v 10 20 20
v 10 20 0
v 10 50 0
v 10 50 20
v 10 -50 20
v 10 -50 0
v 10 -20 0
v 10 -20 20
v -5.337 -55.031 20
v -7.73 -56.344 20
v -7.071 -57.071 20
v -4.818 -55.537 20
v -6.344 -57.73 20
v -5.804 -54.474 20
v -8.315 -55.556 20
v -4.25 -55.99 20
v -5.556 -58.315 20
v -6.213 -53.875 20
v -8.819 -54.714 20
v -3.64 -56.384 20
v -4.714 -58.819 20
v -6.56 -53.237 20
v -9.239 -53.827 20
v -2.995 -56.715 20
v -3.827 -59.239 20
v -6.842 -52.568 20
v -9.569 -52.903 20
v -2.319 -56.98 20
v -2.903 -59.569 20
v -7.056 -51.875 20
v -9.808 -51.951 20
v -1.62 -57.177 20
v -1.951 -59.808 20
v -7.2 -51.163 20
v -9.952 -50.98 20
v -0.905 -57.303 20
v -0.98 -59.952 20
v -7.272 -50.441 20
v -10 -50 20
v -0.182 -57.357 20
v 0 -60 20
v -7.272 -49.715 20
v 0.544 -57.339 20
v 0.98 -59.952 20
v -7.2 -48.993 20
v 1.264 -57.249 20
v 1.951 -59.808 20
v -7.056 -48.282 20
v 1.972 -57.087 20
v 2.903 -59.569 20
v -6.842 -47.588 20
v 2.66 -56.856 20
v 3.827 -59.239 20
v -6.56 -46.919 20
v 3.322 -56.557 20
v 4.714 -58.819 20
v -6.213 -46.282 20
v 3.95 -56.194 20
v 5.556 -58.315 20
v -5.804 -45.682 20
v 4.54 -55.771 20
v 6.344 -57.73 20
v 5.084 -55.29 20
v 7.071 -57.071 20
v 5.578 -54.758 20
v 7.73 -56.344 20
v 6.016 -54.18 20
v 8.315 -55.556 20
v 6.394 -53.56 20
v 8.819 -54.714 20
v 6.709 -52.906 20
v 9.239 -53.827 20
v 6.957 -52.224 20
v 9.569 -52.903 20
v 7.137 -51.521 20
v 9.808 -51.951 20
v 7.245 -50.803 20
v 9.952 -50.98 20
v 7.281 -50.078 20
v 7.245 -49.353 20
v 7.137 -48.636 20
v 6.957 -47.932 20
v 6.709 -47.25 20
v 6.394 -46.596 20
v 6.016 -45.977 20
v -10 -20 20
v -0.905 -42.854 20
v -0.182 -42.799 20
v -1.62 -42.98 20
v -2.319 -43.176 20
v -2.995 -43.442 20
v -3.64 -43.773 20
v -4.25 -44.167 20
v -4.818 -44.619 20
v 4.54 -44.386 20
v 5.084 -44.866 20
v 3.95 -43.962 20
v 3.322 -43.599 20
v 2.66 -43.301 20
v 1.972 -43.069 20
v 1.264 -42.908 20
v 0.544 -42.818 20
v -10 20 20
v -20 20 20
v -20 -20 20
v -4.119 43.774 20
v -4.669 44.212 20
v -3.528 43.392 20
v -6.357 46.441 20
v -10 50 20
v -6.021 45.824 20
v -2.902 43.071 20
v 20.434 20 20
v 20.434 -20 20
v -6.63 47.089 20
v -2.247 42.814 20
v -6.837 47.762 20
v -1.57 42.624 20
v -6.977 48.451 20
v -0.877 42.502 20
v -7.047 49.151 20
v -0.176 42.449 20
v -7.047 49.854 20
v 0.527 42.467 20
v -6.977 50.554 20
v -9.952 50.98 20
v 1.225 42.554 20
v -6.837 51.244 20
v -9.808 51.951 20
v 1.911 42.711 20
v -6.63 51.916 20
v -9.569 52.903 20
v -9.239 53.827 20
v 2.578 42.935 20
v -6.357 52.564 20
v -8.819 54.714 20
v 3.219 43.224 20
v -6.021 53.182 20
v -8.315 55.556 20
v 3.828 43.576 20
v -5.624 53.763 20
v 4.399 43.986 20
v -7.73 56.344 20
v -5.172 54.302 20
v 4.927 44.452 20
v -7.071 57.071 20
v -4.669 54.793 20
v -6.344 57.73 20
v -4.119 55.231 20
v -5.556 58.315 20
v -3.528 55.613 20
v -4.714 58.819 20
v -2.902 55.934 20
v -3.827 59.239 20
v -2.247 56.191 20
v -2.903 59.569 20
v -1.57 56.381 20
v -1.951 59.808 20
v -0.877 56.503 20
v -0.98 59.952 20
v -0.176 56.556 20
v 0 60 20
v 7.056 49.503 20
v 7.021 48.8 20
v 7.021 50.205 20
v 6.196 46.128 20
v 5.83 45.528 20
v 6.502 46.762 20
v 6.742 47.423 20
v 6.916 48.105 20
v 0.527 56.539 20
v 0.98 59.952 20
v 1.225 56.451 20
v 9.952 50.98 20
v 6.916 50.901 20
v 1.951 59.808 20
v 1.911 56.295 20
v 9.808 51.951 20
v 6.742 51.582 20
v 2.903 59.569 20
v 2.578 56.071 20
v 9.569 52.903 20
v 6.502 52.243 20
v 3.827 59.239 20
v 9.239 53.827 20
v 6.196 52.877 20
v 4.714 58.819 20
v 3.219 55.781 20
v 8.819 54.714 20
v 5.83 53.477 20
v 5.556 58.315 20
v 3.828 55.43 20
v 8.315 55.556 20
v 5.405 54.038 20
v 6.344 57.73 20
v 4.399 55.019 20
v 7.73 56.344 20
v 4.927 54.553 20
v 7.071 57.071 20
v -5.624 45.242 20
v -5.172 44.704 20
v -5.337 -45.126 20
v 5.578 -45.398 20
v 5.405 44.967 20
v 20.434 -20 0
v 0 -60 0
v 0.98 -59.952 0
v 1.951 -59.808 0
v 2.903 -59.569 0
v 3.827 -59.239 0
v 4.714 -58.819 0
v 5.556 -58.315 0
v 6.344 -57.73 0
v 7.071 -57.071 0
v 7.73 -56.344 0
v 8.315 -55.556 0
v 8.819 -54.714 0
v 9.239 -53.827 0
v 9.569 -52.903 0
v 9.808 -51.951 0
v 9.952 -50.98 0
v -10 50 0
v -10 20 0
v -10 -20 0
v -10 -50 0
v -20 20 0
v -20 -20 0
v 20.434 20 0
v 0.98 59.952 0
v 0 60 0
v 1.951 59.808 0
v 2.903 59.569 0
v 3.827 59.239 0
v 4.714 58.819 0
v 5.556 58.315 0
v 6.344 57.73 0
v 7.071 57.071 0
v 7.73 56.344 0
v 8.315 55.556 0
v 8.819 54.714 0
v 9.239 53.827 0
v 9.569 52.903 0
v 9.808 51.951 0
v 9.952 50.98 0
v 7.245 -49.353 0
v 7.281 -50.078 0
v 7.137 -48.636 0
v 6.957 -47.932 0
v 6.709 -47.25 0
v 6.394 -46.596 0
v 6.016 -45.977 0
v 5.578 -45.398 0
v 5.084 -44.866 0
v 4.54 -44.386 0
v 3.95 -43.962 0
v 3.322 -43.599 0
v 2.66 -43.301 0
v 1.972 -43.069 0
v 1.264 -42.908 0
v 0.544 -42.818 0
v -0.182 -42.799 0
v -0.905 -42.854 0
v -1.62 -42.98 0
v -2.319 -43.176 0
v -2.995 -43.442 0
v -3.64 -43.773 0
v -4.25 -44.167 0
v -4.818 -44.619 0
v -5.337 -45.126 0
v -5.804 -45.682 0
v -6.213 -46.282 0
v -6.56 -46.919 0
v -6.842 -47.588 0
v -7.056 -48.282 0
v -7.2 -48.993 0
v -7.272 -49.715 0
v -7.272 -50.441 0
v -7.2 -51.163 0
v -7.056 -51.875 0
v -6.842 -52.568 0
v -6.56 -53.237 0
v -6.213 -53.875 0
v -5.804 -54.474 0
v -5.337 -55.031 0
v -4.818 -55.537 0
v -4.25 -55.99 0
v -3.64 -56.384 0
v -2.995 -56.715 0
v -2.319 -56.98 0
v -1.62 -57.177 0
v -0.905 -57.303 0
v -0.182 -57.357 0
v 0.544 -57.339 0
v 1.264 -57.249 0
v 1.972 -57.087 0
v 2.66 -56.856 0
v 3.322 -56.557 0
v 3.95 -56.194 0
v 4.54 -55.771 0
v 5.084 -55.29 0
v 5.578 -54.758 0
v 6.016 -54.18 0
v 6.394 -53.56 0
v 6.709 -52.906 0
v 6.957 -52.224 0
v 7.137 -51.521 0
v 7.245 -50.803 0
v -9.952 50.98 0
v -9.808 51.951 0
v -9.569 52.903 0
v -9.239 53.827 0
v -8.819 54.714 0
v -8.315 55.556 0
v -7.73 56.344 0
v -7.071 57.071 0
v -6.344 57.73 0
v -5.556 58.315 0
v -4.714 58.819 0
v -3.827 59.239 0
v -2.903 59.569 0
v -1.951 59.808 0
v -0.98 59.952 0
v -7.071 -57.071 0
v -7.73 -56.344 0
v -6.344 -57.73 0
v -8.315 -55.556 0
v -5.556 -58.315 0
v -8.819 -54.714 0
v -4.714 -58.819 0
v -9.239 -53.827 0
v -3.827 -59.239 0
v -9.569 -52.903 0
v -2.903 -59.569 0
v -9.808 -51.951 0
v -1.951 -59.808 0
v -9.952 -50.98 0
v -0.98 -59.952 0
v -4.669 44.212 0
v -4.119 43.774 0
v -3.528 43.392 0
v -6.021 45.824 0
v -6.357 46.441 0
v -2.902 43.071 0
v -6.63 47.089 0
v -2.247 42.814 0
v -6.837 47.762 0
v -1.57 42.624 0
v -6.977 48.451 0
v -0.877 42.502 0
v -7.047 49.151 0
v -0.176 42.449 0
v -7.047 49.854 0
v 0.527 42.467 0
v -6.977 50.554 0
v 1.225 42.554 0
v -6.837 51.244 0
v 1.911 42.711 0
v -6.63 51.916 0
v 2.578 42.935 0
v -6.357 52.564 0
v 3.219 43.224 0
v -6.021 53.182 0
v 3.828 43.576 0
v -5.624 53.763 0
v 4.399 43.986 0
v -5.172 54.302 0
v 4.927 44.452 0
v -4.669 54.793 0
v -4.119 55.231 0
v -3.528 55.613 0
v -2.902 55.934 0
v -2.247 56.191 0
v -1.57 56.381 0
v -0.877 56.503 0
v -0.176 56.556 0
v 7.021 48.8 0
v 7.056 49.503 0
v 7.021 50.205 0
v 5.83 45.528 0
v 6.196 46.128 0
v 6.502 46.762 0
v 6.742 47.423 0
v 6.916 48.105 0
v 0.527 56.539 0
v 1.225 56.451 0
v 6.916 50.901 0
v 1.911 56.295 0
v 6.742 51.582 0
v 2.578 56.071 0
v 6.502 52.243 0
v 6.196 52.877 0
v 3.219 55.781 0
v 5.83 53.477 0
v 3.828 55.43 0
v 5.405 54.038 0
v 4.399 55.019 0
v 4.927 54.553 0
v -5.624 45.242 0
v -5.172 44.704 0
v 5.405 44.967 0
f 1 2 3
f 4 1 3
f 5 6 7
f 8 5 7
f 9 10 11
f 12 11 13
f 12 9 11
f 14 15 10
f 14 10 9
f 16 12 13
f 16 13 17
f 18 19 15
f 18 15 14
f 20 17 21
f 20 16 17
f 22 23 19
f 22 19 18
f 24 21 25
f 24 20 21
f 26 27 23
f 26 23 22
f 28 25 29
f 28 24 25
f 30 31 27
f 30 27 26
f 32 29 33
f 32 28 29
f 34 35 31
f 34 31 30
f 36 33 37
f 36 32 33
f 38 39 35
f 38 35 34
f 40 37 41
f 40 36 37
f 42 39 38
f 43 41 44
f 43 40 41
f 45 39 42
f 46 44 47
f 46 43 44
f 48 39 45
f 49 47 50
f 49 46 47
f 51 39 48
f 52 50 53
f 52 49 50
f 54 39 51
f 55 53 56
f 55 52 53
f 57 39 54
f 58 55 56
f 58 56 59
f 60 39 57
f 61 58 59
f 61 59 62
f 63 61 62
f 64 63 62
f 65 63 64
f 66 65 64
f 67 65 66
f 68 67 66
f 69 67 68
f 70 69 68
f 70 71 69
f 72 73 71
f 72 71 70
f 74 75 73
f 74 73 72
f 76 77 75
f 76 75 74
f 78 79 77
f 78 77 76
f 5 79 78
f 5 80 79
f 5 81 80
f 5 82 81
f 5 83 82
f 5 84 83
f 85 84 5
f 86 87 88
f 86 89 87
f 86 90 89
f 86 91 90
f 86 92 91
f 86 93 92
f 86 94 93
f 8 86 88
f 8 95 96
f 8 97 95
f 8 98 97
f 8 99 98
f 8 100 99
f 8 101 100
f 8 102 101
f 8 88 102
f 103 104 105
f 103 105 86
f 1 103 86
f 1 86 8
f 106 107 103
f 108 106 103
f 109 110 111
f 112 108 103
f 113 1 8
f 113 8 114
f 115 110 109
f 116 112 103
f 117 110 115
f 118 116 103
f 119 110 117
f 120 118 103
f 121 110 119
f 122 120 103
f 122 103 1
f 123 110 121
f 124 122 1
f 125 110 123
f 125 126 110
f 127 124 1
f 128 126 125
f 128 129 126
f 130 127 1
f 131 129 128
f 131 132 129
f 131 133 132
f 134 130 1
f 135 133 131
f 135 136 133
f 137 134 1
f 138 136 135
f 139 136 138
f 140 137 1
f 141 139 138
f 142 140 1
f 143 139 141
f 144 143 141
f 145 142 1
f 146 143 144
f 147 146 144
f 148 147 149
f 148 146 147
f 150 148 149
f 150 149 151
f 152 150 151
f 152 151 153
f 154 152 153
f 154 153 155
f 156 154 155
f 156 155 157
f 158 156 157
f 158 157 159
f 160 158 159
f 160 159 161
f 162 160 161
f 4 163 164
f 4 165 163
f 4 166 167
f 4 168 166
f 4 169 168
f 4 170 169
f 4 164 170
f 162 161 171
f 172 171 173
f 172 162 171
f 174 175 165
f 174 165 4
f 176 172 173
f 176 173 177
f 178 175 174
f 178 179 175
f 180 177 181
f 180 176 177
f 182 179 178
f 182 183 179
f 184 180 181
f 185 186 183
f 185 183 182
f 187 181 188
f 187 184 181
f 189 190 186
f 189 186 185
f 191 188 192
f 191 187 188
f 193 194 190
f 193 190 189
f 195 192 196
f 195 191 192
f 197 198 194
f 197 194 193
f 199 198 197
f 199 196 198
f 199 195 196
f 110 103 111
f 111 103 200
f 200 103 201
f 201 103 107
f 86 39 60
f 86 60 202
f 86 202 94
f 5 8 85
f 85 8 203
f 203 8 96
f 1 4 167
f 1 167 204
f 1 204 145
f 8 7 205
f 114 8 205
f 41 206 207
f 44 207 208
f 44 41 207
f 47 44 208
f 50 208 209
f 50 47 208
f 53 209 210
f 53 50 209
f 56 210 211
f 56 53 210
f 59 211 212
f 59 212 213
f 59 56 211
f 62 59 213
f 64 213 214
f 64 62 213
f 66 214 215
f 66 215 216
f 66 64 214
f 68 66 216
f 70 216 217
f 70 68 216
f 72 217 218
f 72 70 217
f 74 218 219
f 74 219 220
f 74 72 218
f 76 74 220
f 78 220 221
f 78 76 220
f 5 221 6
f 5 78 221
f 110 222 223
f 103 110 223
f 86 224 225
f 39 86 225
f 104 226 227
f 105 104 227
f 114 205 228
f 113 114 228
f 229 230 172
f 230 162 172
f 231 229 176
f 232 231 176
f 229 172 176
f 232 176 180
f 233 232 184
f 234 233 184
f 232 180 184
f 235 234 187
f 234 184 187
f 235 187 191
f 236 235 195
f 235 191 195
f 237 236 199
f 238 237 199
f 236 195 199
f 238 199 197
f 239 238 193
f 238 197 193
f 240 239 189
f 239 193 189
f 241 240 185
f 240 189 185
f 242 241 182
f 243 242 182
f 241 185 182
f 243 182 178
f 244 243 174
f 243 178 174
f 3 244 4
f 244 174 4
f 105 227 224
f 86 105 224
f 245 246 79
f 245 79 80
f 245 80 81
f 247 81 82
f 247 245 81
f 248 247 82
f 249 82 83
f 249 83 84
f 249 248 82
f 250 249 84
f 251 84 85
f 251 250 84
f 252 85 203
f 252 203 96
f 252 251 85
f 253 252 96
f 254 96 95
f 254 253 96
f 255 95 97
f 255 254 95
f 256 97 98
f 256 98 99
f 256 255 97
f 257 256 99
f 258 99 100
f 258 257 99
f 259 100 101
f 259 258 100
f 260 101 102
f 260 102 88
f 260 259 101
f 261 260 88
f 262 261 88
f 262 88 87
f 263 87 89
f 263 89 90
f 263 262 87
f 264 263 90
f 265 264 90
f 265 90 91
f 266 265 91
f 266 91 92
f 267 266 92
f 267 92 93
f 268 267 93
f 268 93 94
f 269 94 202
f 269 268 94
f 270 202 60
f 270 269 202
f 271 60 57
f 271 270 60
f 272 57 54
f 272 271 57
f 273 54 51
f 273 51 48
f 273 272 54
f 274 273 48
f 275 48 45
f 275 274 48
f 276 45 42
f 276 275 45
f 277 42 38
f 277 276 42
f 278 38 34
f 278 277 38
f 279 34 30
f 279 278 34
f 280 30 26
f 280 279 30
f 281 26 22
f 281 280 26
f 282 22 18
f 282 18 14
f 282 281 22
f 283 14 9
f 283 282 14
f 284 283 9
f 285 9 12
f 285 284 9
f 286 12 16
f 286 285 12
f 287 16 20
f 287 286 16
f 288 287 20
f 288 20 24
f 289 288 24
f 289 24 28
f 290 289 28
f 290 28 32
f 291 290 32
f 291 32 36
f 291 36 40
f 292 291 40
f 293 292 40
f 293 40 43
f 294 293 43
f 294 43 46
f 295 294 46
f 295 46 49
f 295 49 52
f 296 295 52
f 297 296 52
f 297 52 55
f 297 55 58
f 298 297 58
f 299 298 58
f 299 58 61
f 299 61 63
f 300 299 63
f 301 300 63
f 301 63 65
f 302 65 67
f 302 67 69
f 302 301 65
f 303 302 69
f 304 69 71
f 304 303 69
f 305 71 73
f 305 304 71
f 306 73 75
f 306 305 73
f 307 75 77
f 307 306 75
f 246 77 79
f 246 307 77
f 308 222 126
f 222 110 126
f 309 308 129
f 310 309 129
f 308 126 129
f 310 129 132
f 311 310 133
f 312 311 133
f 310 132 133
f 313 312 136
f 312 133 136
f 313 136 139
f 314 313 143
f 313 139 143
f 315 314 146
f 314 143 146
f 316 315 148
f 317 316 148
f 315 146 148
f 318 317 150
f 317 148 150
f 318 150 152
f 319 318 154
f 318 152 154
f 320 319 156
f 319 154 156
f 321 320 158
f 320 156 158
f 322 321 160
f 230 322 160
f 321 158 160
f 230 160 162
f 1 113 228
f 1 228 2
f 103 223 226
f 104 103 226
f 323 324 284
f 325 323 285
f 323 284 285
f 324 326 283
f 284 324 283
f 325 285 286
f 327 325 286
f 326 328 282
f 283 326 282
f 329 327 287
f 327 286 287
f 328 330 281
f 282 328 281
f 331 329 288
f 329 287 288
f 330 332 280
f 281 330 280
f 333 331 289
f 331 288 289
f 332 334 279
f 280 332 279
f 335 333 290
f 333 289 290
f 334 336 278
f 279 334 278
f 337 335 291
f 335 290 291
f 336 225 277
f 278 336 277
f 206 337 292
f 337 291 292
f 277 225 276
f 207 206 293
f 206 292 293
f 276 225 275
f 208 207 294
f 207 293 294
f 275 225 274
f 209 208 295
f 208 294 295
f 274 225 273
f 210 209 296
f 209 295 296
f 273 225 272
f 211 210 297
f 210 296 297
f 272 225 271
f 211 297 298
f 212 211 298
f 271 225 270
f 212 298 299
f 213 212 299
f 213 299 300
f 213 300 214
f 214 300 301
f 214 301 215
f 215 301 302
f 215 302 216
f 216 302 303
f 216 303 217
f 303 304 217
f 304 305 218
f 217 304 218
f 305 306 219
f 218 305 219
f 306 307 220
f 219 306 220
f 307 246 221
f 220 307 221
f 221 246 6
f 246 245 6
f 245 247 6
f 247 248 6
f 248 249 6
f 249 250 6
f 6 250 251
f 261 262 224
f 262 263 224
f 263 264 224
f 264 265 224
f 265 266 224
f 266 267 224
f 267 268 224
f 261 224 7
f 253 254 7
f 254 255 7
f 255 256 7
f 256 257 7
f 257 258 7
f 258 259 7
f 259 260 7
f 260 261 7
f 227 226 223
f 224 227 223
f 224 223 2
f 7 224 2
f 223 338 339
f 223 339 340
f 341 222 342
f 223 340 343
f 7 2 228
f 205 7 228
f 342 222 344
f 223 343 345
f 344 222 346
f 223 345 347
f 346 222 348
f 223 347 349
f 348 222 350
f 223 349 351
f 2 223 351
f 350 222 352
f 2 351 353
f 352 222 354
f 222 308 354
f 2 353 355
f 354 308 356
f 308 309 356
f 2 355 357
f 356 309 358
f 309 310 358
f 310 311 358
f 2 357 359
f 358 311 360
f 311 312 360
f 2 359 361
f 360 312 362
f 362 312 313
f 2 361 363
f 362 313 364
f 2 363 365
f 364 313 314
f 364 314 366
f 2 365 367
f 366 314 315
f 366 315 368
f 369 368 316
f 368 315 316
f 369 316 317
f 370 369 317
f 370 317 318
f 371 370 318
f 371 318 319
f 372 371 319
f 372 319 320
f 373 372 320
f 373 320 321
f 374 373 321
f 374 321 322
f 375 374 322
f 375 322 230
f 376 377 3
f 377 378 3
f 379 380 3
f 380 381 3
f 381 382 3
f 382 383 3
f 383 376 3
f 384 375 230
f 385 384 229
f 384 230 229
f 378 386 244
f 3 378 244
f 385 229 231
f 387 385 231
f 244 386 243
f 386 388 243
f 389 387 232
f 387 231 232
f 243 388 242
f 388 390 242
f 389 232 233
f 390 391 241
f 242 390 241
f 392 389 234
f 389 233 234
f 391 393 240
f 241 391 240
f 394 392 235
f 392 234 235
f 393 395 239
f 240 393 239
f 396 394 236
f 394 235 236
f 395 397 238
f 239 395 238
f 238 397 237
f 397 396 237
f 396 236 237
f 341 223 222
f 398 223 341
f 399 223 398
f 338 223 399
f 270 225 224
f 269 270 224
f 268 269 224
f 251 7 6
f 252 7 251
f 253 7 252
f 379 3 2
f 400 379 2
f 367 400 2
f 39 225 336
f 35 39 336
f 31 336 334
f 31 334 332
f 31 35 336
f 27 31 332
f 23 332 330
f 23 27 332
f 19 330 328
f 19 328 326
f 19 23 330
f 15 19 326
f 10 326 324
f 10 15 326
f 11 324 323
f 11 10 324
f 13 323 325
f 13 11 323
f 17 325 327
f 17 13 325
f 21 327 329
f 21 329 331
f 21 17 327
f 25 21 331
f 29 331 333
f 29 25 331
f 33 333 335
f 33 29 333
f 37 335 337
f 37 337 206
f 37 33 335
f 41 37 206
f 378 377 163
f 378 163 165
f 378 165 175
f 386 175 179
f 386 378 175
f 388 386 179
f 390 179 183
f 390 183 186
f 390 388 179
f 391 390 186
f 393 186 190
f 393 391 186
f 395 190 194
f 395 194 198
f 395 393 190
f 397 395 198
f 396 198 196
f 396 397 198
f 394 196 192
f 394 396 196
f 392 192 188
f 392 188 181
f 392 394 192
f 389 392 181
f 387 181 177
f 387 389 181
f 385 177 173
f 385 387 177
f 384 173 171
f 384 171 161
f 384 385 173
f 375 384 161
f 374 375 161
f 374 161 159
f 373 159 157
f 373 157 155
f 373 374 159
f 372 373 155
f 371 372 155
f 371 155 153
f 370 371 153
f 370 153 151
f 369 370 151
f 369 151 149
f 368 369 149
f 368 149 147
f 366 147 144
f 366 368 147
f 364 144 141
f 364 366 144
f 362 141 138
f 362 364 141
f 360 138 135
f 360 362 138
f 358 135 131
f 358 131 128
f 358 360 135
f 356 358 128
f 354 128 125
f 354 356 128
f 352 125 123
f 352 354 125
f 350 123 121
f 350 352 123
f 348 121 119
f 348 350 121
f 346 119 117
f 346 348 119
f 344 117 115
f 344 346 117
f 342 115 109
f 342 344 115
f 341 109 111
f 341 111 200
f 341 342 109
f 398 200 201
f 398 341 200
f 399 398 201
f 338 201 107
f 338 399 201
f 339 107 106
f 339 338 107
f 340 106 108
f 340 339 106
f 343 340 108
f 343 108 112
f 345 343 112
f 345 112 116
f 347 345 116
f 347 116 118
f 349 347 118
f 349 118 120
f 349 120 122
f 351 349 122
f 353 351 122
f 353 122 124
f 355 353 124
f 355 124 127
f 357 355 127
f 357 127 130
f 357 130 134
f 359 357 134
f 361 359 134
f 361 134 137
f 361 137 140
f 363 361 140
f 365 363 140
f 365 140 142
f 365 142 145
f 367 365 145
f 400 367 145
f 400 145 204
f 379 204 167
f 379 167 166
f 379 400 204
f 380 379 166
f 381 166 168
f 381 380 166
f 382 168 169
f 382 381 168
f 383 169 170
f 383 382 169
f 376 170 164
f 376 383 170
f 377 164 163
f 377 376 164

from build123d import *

# Parameters (mm, degrees)
F0_R     = 7.2809687116
F0_R_2   = 7.0556428797
F1_DEPTH = 20
F2_R     = 9.99999


# Not quite as in the source:
# - a fillet or chamfer is up to 0.001 mm smaller than in the source, because OpenCascade refuses the exact size


with BuildPart() as f1:
    # F0 (on Top) → F1 (new body)
    with BuildSketch(Plane.XY):
        Polygon((-20, 20), (-20, 0), (-20, -20), (-10, -20), (-10, -60), (10, -60), (10, -20), (20.4342082143, -20), (20.4342082143, 20), (10, 20), (10, 60), (-10, 60), (-10, 20), align=None)
        with Locations((0, -50.0781983137)):
            Circle(F0_R, mode=Mode.SUBTRACT)
        with Locations((0, 49.5025888085)):
            Circle(F0_R_2, mode=Mode.SUBTRACT)
    extrude(amount=F1_DEPTH)

    # F2 (radius 10 in the source; OpenCascade refuses exactly that, so slightly less here)
    f2_edges = [f1.edges().sort_by_distance(p)[0] for p in [
        (10, 60, 10),
        (-10, 60, 10),
        (10, -60, 10),
        (-10, -60, 10),
    ]]
    fillet(f2_edges, radius=F2_R)


solid = f1.part
